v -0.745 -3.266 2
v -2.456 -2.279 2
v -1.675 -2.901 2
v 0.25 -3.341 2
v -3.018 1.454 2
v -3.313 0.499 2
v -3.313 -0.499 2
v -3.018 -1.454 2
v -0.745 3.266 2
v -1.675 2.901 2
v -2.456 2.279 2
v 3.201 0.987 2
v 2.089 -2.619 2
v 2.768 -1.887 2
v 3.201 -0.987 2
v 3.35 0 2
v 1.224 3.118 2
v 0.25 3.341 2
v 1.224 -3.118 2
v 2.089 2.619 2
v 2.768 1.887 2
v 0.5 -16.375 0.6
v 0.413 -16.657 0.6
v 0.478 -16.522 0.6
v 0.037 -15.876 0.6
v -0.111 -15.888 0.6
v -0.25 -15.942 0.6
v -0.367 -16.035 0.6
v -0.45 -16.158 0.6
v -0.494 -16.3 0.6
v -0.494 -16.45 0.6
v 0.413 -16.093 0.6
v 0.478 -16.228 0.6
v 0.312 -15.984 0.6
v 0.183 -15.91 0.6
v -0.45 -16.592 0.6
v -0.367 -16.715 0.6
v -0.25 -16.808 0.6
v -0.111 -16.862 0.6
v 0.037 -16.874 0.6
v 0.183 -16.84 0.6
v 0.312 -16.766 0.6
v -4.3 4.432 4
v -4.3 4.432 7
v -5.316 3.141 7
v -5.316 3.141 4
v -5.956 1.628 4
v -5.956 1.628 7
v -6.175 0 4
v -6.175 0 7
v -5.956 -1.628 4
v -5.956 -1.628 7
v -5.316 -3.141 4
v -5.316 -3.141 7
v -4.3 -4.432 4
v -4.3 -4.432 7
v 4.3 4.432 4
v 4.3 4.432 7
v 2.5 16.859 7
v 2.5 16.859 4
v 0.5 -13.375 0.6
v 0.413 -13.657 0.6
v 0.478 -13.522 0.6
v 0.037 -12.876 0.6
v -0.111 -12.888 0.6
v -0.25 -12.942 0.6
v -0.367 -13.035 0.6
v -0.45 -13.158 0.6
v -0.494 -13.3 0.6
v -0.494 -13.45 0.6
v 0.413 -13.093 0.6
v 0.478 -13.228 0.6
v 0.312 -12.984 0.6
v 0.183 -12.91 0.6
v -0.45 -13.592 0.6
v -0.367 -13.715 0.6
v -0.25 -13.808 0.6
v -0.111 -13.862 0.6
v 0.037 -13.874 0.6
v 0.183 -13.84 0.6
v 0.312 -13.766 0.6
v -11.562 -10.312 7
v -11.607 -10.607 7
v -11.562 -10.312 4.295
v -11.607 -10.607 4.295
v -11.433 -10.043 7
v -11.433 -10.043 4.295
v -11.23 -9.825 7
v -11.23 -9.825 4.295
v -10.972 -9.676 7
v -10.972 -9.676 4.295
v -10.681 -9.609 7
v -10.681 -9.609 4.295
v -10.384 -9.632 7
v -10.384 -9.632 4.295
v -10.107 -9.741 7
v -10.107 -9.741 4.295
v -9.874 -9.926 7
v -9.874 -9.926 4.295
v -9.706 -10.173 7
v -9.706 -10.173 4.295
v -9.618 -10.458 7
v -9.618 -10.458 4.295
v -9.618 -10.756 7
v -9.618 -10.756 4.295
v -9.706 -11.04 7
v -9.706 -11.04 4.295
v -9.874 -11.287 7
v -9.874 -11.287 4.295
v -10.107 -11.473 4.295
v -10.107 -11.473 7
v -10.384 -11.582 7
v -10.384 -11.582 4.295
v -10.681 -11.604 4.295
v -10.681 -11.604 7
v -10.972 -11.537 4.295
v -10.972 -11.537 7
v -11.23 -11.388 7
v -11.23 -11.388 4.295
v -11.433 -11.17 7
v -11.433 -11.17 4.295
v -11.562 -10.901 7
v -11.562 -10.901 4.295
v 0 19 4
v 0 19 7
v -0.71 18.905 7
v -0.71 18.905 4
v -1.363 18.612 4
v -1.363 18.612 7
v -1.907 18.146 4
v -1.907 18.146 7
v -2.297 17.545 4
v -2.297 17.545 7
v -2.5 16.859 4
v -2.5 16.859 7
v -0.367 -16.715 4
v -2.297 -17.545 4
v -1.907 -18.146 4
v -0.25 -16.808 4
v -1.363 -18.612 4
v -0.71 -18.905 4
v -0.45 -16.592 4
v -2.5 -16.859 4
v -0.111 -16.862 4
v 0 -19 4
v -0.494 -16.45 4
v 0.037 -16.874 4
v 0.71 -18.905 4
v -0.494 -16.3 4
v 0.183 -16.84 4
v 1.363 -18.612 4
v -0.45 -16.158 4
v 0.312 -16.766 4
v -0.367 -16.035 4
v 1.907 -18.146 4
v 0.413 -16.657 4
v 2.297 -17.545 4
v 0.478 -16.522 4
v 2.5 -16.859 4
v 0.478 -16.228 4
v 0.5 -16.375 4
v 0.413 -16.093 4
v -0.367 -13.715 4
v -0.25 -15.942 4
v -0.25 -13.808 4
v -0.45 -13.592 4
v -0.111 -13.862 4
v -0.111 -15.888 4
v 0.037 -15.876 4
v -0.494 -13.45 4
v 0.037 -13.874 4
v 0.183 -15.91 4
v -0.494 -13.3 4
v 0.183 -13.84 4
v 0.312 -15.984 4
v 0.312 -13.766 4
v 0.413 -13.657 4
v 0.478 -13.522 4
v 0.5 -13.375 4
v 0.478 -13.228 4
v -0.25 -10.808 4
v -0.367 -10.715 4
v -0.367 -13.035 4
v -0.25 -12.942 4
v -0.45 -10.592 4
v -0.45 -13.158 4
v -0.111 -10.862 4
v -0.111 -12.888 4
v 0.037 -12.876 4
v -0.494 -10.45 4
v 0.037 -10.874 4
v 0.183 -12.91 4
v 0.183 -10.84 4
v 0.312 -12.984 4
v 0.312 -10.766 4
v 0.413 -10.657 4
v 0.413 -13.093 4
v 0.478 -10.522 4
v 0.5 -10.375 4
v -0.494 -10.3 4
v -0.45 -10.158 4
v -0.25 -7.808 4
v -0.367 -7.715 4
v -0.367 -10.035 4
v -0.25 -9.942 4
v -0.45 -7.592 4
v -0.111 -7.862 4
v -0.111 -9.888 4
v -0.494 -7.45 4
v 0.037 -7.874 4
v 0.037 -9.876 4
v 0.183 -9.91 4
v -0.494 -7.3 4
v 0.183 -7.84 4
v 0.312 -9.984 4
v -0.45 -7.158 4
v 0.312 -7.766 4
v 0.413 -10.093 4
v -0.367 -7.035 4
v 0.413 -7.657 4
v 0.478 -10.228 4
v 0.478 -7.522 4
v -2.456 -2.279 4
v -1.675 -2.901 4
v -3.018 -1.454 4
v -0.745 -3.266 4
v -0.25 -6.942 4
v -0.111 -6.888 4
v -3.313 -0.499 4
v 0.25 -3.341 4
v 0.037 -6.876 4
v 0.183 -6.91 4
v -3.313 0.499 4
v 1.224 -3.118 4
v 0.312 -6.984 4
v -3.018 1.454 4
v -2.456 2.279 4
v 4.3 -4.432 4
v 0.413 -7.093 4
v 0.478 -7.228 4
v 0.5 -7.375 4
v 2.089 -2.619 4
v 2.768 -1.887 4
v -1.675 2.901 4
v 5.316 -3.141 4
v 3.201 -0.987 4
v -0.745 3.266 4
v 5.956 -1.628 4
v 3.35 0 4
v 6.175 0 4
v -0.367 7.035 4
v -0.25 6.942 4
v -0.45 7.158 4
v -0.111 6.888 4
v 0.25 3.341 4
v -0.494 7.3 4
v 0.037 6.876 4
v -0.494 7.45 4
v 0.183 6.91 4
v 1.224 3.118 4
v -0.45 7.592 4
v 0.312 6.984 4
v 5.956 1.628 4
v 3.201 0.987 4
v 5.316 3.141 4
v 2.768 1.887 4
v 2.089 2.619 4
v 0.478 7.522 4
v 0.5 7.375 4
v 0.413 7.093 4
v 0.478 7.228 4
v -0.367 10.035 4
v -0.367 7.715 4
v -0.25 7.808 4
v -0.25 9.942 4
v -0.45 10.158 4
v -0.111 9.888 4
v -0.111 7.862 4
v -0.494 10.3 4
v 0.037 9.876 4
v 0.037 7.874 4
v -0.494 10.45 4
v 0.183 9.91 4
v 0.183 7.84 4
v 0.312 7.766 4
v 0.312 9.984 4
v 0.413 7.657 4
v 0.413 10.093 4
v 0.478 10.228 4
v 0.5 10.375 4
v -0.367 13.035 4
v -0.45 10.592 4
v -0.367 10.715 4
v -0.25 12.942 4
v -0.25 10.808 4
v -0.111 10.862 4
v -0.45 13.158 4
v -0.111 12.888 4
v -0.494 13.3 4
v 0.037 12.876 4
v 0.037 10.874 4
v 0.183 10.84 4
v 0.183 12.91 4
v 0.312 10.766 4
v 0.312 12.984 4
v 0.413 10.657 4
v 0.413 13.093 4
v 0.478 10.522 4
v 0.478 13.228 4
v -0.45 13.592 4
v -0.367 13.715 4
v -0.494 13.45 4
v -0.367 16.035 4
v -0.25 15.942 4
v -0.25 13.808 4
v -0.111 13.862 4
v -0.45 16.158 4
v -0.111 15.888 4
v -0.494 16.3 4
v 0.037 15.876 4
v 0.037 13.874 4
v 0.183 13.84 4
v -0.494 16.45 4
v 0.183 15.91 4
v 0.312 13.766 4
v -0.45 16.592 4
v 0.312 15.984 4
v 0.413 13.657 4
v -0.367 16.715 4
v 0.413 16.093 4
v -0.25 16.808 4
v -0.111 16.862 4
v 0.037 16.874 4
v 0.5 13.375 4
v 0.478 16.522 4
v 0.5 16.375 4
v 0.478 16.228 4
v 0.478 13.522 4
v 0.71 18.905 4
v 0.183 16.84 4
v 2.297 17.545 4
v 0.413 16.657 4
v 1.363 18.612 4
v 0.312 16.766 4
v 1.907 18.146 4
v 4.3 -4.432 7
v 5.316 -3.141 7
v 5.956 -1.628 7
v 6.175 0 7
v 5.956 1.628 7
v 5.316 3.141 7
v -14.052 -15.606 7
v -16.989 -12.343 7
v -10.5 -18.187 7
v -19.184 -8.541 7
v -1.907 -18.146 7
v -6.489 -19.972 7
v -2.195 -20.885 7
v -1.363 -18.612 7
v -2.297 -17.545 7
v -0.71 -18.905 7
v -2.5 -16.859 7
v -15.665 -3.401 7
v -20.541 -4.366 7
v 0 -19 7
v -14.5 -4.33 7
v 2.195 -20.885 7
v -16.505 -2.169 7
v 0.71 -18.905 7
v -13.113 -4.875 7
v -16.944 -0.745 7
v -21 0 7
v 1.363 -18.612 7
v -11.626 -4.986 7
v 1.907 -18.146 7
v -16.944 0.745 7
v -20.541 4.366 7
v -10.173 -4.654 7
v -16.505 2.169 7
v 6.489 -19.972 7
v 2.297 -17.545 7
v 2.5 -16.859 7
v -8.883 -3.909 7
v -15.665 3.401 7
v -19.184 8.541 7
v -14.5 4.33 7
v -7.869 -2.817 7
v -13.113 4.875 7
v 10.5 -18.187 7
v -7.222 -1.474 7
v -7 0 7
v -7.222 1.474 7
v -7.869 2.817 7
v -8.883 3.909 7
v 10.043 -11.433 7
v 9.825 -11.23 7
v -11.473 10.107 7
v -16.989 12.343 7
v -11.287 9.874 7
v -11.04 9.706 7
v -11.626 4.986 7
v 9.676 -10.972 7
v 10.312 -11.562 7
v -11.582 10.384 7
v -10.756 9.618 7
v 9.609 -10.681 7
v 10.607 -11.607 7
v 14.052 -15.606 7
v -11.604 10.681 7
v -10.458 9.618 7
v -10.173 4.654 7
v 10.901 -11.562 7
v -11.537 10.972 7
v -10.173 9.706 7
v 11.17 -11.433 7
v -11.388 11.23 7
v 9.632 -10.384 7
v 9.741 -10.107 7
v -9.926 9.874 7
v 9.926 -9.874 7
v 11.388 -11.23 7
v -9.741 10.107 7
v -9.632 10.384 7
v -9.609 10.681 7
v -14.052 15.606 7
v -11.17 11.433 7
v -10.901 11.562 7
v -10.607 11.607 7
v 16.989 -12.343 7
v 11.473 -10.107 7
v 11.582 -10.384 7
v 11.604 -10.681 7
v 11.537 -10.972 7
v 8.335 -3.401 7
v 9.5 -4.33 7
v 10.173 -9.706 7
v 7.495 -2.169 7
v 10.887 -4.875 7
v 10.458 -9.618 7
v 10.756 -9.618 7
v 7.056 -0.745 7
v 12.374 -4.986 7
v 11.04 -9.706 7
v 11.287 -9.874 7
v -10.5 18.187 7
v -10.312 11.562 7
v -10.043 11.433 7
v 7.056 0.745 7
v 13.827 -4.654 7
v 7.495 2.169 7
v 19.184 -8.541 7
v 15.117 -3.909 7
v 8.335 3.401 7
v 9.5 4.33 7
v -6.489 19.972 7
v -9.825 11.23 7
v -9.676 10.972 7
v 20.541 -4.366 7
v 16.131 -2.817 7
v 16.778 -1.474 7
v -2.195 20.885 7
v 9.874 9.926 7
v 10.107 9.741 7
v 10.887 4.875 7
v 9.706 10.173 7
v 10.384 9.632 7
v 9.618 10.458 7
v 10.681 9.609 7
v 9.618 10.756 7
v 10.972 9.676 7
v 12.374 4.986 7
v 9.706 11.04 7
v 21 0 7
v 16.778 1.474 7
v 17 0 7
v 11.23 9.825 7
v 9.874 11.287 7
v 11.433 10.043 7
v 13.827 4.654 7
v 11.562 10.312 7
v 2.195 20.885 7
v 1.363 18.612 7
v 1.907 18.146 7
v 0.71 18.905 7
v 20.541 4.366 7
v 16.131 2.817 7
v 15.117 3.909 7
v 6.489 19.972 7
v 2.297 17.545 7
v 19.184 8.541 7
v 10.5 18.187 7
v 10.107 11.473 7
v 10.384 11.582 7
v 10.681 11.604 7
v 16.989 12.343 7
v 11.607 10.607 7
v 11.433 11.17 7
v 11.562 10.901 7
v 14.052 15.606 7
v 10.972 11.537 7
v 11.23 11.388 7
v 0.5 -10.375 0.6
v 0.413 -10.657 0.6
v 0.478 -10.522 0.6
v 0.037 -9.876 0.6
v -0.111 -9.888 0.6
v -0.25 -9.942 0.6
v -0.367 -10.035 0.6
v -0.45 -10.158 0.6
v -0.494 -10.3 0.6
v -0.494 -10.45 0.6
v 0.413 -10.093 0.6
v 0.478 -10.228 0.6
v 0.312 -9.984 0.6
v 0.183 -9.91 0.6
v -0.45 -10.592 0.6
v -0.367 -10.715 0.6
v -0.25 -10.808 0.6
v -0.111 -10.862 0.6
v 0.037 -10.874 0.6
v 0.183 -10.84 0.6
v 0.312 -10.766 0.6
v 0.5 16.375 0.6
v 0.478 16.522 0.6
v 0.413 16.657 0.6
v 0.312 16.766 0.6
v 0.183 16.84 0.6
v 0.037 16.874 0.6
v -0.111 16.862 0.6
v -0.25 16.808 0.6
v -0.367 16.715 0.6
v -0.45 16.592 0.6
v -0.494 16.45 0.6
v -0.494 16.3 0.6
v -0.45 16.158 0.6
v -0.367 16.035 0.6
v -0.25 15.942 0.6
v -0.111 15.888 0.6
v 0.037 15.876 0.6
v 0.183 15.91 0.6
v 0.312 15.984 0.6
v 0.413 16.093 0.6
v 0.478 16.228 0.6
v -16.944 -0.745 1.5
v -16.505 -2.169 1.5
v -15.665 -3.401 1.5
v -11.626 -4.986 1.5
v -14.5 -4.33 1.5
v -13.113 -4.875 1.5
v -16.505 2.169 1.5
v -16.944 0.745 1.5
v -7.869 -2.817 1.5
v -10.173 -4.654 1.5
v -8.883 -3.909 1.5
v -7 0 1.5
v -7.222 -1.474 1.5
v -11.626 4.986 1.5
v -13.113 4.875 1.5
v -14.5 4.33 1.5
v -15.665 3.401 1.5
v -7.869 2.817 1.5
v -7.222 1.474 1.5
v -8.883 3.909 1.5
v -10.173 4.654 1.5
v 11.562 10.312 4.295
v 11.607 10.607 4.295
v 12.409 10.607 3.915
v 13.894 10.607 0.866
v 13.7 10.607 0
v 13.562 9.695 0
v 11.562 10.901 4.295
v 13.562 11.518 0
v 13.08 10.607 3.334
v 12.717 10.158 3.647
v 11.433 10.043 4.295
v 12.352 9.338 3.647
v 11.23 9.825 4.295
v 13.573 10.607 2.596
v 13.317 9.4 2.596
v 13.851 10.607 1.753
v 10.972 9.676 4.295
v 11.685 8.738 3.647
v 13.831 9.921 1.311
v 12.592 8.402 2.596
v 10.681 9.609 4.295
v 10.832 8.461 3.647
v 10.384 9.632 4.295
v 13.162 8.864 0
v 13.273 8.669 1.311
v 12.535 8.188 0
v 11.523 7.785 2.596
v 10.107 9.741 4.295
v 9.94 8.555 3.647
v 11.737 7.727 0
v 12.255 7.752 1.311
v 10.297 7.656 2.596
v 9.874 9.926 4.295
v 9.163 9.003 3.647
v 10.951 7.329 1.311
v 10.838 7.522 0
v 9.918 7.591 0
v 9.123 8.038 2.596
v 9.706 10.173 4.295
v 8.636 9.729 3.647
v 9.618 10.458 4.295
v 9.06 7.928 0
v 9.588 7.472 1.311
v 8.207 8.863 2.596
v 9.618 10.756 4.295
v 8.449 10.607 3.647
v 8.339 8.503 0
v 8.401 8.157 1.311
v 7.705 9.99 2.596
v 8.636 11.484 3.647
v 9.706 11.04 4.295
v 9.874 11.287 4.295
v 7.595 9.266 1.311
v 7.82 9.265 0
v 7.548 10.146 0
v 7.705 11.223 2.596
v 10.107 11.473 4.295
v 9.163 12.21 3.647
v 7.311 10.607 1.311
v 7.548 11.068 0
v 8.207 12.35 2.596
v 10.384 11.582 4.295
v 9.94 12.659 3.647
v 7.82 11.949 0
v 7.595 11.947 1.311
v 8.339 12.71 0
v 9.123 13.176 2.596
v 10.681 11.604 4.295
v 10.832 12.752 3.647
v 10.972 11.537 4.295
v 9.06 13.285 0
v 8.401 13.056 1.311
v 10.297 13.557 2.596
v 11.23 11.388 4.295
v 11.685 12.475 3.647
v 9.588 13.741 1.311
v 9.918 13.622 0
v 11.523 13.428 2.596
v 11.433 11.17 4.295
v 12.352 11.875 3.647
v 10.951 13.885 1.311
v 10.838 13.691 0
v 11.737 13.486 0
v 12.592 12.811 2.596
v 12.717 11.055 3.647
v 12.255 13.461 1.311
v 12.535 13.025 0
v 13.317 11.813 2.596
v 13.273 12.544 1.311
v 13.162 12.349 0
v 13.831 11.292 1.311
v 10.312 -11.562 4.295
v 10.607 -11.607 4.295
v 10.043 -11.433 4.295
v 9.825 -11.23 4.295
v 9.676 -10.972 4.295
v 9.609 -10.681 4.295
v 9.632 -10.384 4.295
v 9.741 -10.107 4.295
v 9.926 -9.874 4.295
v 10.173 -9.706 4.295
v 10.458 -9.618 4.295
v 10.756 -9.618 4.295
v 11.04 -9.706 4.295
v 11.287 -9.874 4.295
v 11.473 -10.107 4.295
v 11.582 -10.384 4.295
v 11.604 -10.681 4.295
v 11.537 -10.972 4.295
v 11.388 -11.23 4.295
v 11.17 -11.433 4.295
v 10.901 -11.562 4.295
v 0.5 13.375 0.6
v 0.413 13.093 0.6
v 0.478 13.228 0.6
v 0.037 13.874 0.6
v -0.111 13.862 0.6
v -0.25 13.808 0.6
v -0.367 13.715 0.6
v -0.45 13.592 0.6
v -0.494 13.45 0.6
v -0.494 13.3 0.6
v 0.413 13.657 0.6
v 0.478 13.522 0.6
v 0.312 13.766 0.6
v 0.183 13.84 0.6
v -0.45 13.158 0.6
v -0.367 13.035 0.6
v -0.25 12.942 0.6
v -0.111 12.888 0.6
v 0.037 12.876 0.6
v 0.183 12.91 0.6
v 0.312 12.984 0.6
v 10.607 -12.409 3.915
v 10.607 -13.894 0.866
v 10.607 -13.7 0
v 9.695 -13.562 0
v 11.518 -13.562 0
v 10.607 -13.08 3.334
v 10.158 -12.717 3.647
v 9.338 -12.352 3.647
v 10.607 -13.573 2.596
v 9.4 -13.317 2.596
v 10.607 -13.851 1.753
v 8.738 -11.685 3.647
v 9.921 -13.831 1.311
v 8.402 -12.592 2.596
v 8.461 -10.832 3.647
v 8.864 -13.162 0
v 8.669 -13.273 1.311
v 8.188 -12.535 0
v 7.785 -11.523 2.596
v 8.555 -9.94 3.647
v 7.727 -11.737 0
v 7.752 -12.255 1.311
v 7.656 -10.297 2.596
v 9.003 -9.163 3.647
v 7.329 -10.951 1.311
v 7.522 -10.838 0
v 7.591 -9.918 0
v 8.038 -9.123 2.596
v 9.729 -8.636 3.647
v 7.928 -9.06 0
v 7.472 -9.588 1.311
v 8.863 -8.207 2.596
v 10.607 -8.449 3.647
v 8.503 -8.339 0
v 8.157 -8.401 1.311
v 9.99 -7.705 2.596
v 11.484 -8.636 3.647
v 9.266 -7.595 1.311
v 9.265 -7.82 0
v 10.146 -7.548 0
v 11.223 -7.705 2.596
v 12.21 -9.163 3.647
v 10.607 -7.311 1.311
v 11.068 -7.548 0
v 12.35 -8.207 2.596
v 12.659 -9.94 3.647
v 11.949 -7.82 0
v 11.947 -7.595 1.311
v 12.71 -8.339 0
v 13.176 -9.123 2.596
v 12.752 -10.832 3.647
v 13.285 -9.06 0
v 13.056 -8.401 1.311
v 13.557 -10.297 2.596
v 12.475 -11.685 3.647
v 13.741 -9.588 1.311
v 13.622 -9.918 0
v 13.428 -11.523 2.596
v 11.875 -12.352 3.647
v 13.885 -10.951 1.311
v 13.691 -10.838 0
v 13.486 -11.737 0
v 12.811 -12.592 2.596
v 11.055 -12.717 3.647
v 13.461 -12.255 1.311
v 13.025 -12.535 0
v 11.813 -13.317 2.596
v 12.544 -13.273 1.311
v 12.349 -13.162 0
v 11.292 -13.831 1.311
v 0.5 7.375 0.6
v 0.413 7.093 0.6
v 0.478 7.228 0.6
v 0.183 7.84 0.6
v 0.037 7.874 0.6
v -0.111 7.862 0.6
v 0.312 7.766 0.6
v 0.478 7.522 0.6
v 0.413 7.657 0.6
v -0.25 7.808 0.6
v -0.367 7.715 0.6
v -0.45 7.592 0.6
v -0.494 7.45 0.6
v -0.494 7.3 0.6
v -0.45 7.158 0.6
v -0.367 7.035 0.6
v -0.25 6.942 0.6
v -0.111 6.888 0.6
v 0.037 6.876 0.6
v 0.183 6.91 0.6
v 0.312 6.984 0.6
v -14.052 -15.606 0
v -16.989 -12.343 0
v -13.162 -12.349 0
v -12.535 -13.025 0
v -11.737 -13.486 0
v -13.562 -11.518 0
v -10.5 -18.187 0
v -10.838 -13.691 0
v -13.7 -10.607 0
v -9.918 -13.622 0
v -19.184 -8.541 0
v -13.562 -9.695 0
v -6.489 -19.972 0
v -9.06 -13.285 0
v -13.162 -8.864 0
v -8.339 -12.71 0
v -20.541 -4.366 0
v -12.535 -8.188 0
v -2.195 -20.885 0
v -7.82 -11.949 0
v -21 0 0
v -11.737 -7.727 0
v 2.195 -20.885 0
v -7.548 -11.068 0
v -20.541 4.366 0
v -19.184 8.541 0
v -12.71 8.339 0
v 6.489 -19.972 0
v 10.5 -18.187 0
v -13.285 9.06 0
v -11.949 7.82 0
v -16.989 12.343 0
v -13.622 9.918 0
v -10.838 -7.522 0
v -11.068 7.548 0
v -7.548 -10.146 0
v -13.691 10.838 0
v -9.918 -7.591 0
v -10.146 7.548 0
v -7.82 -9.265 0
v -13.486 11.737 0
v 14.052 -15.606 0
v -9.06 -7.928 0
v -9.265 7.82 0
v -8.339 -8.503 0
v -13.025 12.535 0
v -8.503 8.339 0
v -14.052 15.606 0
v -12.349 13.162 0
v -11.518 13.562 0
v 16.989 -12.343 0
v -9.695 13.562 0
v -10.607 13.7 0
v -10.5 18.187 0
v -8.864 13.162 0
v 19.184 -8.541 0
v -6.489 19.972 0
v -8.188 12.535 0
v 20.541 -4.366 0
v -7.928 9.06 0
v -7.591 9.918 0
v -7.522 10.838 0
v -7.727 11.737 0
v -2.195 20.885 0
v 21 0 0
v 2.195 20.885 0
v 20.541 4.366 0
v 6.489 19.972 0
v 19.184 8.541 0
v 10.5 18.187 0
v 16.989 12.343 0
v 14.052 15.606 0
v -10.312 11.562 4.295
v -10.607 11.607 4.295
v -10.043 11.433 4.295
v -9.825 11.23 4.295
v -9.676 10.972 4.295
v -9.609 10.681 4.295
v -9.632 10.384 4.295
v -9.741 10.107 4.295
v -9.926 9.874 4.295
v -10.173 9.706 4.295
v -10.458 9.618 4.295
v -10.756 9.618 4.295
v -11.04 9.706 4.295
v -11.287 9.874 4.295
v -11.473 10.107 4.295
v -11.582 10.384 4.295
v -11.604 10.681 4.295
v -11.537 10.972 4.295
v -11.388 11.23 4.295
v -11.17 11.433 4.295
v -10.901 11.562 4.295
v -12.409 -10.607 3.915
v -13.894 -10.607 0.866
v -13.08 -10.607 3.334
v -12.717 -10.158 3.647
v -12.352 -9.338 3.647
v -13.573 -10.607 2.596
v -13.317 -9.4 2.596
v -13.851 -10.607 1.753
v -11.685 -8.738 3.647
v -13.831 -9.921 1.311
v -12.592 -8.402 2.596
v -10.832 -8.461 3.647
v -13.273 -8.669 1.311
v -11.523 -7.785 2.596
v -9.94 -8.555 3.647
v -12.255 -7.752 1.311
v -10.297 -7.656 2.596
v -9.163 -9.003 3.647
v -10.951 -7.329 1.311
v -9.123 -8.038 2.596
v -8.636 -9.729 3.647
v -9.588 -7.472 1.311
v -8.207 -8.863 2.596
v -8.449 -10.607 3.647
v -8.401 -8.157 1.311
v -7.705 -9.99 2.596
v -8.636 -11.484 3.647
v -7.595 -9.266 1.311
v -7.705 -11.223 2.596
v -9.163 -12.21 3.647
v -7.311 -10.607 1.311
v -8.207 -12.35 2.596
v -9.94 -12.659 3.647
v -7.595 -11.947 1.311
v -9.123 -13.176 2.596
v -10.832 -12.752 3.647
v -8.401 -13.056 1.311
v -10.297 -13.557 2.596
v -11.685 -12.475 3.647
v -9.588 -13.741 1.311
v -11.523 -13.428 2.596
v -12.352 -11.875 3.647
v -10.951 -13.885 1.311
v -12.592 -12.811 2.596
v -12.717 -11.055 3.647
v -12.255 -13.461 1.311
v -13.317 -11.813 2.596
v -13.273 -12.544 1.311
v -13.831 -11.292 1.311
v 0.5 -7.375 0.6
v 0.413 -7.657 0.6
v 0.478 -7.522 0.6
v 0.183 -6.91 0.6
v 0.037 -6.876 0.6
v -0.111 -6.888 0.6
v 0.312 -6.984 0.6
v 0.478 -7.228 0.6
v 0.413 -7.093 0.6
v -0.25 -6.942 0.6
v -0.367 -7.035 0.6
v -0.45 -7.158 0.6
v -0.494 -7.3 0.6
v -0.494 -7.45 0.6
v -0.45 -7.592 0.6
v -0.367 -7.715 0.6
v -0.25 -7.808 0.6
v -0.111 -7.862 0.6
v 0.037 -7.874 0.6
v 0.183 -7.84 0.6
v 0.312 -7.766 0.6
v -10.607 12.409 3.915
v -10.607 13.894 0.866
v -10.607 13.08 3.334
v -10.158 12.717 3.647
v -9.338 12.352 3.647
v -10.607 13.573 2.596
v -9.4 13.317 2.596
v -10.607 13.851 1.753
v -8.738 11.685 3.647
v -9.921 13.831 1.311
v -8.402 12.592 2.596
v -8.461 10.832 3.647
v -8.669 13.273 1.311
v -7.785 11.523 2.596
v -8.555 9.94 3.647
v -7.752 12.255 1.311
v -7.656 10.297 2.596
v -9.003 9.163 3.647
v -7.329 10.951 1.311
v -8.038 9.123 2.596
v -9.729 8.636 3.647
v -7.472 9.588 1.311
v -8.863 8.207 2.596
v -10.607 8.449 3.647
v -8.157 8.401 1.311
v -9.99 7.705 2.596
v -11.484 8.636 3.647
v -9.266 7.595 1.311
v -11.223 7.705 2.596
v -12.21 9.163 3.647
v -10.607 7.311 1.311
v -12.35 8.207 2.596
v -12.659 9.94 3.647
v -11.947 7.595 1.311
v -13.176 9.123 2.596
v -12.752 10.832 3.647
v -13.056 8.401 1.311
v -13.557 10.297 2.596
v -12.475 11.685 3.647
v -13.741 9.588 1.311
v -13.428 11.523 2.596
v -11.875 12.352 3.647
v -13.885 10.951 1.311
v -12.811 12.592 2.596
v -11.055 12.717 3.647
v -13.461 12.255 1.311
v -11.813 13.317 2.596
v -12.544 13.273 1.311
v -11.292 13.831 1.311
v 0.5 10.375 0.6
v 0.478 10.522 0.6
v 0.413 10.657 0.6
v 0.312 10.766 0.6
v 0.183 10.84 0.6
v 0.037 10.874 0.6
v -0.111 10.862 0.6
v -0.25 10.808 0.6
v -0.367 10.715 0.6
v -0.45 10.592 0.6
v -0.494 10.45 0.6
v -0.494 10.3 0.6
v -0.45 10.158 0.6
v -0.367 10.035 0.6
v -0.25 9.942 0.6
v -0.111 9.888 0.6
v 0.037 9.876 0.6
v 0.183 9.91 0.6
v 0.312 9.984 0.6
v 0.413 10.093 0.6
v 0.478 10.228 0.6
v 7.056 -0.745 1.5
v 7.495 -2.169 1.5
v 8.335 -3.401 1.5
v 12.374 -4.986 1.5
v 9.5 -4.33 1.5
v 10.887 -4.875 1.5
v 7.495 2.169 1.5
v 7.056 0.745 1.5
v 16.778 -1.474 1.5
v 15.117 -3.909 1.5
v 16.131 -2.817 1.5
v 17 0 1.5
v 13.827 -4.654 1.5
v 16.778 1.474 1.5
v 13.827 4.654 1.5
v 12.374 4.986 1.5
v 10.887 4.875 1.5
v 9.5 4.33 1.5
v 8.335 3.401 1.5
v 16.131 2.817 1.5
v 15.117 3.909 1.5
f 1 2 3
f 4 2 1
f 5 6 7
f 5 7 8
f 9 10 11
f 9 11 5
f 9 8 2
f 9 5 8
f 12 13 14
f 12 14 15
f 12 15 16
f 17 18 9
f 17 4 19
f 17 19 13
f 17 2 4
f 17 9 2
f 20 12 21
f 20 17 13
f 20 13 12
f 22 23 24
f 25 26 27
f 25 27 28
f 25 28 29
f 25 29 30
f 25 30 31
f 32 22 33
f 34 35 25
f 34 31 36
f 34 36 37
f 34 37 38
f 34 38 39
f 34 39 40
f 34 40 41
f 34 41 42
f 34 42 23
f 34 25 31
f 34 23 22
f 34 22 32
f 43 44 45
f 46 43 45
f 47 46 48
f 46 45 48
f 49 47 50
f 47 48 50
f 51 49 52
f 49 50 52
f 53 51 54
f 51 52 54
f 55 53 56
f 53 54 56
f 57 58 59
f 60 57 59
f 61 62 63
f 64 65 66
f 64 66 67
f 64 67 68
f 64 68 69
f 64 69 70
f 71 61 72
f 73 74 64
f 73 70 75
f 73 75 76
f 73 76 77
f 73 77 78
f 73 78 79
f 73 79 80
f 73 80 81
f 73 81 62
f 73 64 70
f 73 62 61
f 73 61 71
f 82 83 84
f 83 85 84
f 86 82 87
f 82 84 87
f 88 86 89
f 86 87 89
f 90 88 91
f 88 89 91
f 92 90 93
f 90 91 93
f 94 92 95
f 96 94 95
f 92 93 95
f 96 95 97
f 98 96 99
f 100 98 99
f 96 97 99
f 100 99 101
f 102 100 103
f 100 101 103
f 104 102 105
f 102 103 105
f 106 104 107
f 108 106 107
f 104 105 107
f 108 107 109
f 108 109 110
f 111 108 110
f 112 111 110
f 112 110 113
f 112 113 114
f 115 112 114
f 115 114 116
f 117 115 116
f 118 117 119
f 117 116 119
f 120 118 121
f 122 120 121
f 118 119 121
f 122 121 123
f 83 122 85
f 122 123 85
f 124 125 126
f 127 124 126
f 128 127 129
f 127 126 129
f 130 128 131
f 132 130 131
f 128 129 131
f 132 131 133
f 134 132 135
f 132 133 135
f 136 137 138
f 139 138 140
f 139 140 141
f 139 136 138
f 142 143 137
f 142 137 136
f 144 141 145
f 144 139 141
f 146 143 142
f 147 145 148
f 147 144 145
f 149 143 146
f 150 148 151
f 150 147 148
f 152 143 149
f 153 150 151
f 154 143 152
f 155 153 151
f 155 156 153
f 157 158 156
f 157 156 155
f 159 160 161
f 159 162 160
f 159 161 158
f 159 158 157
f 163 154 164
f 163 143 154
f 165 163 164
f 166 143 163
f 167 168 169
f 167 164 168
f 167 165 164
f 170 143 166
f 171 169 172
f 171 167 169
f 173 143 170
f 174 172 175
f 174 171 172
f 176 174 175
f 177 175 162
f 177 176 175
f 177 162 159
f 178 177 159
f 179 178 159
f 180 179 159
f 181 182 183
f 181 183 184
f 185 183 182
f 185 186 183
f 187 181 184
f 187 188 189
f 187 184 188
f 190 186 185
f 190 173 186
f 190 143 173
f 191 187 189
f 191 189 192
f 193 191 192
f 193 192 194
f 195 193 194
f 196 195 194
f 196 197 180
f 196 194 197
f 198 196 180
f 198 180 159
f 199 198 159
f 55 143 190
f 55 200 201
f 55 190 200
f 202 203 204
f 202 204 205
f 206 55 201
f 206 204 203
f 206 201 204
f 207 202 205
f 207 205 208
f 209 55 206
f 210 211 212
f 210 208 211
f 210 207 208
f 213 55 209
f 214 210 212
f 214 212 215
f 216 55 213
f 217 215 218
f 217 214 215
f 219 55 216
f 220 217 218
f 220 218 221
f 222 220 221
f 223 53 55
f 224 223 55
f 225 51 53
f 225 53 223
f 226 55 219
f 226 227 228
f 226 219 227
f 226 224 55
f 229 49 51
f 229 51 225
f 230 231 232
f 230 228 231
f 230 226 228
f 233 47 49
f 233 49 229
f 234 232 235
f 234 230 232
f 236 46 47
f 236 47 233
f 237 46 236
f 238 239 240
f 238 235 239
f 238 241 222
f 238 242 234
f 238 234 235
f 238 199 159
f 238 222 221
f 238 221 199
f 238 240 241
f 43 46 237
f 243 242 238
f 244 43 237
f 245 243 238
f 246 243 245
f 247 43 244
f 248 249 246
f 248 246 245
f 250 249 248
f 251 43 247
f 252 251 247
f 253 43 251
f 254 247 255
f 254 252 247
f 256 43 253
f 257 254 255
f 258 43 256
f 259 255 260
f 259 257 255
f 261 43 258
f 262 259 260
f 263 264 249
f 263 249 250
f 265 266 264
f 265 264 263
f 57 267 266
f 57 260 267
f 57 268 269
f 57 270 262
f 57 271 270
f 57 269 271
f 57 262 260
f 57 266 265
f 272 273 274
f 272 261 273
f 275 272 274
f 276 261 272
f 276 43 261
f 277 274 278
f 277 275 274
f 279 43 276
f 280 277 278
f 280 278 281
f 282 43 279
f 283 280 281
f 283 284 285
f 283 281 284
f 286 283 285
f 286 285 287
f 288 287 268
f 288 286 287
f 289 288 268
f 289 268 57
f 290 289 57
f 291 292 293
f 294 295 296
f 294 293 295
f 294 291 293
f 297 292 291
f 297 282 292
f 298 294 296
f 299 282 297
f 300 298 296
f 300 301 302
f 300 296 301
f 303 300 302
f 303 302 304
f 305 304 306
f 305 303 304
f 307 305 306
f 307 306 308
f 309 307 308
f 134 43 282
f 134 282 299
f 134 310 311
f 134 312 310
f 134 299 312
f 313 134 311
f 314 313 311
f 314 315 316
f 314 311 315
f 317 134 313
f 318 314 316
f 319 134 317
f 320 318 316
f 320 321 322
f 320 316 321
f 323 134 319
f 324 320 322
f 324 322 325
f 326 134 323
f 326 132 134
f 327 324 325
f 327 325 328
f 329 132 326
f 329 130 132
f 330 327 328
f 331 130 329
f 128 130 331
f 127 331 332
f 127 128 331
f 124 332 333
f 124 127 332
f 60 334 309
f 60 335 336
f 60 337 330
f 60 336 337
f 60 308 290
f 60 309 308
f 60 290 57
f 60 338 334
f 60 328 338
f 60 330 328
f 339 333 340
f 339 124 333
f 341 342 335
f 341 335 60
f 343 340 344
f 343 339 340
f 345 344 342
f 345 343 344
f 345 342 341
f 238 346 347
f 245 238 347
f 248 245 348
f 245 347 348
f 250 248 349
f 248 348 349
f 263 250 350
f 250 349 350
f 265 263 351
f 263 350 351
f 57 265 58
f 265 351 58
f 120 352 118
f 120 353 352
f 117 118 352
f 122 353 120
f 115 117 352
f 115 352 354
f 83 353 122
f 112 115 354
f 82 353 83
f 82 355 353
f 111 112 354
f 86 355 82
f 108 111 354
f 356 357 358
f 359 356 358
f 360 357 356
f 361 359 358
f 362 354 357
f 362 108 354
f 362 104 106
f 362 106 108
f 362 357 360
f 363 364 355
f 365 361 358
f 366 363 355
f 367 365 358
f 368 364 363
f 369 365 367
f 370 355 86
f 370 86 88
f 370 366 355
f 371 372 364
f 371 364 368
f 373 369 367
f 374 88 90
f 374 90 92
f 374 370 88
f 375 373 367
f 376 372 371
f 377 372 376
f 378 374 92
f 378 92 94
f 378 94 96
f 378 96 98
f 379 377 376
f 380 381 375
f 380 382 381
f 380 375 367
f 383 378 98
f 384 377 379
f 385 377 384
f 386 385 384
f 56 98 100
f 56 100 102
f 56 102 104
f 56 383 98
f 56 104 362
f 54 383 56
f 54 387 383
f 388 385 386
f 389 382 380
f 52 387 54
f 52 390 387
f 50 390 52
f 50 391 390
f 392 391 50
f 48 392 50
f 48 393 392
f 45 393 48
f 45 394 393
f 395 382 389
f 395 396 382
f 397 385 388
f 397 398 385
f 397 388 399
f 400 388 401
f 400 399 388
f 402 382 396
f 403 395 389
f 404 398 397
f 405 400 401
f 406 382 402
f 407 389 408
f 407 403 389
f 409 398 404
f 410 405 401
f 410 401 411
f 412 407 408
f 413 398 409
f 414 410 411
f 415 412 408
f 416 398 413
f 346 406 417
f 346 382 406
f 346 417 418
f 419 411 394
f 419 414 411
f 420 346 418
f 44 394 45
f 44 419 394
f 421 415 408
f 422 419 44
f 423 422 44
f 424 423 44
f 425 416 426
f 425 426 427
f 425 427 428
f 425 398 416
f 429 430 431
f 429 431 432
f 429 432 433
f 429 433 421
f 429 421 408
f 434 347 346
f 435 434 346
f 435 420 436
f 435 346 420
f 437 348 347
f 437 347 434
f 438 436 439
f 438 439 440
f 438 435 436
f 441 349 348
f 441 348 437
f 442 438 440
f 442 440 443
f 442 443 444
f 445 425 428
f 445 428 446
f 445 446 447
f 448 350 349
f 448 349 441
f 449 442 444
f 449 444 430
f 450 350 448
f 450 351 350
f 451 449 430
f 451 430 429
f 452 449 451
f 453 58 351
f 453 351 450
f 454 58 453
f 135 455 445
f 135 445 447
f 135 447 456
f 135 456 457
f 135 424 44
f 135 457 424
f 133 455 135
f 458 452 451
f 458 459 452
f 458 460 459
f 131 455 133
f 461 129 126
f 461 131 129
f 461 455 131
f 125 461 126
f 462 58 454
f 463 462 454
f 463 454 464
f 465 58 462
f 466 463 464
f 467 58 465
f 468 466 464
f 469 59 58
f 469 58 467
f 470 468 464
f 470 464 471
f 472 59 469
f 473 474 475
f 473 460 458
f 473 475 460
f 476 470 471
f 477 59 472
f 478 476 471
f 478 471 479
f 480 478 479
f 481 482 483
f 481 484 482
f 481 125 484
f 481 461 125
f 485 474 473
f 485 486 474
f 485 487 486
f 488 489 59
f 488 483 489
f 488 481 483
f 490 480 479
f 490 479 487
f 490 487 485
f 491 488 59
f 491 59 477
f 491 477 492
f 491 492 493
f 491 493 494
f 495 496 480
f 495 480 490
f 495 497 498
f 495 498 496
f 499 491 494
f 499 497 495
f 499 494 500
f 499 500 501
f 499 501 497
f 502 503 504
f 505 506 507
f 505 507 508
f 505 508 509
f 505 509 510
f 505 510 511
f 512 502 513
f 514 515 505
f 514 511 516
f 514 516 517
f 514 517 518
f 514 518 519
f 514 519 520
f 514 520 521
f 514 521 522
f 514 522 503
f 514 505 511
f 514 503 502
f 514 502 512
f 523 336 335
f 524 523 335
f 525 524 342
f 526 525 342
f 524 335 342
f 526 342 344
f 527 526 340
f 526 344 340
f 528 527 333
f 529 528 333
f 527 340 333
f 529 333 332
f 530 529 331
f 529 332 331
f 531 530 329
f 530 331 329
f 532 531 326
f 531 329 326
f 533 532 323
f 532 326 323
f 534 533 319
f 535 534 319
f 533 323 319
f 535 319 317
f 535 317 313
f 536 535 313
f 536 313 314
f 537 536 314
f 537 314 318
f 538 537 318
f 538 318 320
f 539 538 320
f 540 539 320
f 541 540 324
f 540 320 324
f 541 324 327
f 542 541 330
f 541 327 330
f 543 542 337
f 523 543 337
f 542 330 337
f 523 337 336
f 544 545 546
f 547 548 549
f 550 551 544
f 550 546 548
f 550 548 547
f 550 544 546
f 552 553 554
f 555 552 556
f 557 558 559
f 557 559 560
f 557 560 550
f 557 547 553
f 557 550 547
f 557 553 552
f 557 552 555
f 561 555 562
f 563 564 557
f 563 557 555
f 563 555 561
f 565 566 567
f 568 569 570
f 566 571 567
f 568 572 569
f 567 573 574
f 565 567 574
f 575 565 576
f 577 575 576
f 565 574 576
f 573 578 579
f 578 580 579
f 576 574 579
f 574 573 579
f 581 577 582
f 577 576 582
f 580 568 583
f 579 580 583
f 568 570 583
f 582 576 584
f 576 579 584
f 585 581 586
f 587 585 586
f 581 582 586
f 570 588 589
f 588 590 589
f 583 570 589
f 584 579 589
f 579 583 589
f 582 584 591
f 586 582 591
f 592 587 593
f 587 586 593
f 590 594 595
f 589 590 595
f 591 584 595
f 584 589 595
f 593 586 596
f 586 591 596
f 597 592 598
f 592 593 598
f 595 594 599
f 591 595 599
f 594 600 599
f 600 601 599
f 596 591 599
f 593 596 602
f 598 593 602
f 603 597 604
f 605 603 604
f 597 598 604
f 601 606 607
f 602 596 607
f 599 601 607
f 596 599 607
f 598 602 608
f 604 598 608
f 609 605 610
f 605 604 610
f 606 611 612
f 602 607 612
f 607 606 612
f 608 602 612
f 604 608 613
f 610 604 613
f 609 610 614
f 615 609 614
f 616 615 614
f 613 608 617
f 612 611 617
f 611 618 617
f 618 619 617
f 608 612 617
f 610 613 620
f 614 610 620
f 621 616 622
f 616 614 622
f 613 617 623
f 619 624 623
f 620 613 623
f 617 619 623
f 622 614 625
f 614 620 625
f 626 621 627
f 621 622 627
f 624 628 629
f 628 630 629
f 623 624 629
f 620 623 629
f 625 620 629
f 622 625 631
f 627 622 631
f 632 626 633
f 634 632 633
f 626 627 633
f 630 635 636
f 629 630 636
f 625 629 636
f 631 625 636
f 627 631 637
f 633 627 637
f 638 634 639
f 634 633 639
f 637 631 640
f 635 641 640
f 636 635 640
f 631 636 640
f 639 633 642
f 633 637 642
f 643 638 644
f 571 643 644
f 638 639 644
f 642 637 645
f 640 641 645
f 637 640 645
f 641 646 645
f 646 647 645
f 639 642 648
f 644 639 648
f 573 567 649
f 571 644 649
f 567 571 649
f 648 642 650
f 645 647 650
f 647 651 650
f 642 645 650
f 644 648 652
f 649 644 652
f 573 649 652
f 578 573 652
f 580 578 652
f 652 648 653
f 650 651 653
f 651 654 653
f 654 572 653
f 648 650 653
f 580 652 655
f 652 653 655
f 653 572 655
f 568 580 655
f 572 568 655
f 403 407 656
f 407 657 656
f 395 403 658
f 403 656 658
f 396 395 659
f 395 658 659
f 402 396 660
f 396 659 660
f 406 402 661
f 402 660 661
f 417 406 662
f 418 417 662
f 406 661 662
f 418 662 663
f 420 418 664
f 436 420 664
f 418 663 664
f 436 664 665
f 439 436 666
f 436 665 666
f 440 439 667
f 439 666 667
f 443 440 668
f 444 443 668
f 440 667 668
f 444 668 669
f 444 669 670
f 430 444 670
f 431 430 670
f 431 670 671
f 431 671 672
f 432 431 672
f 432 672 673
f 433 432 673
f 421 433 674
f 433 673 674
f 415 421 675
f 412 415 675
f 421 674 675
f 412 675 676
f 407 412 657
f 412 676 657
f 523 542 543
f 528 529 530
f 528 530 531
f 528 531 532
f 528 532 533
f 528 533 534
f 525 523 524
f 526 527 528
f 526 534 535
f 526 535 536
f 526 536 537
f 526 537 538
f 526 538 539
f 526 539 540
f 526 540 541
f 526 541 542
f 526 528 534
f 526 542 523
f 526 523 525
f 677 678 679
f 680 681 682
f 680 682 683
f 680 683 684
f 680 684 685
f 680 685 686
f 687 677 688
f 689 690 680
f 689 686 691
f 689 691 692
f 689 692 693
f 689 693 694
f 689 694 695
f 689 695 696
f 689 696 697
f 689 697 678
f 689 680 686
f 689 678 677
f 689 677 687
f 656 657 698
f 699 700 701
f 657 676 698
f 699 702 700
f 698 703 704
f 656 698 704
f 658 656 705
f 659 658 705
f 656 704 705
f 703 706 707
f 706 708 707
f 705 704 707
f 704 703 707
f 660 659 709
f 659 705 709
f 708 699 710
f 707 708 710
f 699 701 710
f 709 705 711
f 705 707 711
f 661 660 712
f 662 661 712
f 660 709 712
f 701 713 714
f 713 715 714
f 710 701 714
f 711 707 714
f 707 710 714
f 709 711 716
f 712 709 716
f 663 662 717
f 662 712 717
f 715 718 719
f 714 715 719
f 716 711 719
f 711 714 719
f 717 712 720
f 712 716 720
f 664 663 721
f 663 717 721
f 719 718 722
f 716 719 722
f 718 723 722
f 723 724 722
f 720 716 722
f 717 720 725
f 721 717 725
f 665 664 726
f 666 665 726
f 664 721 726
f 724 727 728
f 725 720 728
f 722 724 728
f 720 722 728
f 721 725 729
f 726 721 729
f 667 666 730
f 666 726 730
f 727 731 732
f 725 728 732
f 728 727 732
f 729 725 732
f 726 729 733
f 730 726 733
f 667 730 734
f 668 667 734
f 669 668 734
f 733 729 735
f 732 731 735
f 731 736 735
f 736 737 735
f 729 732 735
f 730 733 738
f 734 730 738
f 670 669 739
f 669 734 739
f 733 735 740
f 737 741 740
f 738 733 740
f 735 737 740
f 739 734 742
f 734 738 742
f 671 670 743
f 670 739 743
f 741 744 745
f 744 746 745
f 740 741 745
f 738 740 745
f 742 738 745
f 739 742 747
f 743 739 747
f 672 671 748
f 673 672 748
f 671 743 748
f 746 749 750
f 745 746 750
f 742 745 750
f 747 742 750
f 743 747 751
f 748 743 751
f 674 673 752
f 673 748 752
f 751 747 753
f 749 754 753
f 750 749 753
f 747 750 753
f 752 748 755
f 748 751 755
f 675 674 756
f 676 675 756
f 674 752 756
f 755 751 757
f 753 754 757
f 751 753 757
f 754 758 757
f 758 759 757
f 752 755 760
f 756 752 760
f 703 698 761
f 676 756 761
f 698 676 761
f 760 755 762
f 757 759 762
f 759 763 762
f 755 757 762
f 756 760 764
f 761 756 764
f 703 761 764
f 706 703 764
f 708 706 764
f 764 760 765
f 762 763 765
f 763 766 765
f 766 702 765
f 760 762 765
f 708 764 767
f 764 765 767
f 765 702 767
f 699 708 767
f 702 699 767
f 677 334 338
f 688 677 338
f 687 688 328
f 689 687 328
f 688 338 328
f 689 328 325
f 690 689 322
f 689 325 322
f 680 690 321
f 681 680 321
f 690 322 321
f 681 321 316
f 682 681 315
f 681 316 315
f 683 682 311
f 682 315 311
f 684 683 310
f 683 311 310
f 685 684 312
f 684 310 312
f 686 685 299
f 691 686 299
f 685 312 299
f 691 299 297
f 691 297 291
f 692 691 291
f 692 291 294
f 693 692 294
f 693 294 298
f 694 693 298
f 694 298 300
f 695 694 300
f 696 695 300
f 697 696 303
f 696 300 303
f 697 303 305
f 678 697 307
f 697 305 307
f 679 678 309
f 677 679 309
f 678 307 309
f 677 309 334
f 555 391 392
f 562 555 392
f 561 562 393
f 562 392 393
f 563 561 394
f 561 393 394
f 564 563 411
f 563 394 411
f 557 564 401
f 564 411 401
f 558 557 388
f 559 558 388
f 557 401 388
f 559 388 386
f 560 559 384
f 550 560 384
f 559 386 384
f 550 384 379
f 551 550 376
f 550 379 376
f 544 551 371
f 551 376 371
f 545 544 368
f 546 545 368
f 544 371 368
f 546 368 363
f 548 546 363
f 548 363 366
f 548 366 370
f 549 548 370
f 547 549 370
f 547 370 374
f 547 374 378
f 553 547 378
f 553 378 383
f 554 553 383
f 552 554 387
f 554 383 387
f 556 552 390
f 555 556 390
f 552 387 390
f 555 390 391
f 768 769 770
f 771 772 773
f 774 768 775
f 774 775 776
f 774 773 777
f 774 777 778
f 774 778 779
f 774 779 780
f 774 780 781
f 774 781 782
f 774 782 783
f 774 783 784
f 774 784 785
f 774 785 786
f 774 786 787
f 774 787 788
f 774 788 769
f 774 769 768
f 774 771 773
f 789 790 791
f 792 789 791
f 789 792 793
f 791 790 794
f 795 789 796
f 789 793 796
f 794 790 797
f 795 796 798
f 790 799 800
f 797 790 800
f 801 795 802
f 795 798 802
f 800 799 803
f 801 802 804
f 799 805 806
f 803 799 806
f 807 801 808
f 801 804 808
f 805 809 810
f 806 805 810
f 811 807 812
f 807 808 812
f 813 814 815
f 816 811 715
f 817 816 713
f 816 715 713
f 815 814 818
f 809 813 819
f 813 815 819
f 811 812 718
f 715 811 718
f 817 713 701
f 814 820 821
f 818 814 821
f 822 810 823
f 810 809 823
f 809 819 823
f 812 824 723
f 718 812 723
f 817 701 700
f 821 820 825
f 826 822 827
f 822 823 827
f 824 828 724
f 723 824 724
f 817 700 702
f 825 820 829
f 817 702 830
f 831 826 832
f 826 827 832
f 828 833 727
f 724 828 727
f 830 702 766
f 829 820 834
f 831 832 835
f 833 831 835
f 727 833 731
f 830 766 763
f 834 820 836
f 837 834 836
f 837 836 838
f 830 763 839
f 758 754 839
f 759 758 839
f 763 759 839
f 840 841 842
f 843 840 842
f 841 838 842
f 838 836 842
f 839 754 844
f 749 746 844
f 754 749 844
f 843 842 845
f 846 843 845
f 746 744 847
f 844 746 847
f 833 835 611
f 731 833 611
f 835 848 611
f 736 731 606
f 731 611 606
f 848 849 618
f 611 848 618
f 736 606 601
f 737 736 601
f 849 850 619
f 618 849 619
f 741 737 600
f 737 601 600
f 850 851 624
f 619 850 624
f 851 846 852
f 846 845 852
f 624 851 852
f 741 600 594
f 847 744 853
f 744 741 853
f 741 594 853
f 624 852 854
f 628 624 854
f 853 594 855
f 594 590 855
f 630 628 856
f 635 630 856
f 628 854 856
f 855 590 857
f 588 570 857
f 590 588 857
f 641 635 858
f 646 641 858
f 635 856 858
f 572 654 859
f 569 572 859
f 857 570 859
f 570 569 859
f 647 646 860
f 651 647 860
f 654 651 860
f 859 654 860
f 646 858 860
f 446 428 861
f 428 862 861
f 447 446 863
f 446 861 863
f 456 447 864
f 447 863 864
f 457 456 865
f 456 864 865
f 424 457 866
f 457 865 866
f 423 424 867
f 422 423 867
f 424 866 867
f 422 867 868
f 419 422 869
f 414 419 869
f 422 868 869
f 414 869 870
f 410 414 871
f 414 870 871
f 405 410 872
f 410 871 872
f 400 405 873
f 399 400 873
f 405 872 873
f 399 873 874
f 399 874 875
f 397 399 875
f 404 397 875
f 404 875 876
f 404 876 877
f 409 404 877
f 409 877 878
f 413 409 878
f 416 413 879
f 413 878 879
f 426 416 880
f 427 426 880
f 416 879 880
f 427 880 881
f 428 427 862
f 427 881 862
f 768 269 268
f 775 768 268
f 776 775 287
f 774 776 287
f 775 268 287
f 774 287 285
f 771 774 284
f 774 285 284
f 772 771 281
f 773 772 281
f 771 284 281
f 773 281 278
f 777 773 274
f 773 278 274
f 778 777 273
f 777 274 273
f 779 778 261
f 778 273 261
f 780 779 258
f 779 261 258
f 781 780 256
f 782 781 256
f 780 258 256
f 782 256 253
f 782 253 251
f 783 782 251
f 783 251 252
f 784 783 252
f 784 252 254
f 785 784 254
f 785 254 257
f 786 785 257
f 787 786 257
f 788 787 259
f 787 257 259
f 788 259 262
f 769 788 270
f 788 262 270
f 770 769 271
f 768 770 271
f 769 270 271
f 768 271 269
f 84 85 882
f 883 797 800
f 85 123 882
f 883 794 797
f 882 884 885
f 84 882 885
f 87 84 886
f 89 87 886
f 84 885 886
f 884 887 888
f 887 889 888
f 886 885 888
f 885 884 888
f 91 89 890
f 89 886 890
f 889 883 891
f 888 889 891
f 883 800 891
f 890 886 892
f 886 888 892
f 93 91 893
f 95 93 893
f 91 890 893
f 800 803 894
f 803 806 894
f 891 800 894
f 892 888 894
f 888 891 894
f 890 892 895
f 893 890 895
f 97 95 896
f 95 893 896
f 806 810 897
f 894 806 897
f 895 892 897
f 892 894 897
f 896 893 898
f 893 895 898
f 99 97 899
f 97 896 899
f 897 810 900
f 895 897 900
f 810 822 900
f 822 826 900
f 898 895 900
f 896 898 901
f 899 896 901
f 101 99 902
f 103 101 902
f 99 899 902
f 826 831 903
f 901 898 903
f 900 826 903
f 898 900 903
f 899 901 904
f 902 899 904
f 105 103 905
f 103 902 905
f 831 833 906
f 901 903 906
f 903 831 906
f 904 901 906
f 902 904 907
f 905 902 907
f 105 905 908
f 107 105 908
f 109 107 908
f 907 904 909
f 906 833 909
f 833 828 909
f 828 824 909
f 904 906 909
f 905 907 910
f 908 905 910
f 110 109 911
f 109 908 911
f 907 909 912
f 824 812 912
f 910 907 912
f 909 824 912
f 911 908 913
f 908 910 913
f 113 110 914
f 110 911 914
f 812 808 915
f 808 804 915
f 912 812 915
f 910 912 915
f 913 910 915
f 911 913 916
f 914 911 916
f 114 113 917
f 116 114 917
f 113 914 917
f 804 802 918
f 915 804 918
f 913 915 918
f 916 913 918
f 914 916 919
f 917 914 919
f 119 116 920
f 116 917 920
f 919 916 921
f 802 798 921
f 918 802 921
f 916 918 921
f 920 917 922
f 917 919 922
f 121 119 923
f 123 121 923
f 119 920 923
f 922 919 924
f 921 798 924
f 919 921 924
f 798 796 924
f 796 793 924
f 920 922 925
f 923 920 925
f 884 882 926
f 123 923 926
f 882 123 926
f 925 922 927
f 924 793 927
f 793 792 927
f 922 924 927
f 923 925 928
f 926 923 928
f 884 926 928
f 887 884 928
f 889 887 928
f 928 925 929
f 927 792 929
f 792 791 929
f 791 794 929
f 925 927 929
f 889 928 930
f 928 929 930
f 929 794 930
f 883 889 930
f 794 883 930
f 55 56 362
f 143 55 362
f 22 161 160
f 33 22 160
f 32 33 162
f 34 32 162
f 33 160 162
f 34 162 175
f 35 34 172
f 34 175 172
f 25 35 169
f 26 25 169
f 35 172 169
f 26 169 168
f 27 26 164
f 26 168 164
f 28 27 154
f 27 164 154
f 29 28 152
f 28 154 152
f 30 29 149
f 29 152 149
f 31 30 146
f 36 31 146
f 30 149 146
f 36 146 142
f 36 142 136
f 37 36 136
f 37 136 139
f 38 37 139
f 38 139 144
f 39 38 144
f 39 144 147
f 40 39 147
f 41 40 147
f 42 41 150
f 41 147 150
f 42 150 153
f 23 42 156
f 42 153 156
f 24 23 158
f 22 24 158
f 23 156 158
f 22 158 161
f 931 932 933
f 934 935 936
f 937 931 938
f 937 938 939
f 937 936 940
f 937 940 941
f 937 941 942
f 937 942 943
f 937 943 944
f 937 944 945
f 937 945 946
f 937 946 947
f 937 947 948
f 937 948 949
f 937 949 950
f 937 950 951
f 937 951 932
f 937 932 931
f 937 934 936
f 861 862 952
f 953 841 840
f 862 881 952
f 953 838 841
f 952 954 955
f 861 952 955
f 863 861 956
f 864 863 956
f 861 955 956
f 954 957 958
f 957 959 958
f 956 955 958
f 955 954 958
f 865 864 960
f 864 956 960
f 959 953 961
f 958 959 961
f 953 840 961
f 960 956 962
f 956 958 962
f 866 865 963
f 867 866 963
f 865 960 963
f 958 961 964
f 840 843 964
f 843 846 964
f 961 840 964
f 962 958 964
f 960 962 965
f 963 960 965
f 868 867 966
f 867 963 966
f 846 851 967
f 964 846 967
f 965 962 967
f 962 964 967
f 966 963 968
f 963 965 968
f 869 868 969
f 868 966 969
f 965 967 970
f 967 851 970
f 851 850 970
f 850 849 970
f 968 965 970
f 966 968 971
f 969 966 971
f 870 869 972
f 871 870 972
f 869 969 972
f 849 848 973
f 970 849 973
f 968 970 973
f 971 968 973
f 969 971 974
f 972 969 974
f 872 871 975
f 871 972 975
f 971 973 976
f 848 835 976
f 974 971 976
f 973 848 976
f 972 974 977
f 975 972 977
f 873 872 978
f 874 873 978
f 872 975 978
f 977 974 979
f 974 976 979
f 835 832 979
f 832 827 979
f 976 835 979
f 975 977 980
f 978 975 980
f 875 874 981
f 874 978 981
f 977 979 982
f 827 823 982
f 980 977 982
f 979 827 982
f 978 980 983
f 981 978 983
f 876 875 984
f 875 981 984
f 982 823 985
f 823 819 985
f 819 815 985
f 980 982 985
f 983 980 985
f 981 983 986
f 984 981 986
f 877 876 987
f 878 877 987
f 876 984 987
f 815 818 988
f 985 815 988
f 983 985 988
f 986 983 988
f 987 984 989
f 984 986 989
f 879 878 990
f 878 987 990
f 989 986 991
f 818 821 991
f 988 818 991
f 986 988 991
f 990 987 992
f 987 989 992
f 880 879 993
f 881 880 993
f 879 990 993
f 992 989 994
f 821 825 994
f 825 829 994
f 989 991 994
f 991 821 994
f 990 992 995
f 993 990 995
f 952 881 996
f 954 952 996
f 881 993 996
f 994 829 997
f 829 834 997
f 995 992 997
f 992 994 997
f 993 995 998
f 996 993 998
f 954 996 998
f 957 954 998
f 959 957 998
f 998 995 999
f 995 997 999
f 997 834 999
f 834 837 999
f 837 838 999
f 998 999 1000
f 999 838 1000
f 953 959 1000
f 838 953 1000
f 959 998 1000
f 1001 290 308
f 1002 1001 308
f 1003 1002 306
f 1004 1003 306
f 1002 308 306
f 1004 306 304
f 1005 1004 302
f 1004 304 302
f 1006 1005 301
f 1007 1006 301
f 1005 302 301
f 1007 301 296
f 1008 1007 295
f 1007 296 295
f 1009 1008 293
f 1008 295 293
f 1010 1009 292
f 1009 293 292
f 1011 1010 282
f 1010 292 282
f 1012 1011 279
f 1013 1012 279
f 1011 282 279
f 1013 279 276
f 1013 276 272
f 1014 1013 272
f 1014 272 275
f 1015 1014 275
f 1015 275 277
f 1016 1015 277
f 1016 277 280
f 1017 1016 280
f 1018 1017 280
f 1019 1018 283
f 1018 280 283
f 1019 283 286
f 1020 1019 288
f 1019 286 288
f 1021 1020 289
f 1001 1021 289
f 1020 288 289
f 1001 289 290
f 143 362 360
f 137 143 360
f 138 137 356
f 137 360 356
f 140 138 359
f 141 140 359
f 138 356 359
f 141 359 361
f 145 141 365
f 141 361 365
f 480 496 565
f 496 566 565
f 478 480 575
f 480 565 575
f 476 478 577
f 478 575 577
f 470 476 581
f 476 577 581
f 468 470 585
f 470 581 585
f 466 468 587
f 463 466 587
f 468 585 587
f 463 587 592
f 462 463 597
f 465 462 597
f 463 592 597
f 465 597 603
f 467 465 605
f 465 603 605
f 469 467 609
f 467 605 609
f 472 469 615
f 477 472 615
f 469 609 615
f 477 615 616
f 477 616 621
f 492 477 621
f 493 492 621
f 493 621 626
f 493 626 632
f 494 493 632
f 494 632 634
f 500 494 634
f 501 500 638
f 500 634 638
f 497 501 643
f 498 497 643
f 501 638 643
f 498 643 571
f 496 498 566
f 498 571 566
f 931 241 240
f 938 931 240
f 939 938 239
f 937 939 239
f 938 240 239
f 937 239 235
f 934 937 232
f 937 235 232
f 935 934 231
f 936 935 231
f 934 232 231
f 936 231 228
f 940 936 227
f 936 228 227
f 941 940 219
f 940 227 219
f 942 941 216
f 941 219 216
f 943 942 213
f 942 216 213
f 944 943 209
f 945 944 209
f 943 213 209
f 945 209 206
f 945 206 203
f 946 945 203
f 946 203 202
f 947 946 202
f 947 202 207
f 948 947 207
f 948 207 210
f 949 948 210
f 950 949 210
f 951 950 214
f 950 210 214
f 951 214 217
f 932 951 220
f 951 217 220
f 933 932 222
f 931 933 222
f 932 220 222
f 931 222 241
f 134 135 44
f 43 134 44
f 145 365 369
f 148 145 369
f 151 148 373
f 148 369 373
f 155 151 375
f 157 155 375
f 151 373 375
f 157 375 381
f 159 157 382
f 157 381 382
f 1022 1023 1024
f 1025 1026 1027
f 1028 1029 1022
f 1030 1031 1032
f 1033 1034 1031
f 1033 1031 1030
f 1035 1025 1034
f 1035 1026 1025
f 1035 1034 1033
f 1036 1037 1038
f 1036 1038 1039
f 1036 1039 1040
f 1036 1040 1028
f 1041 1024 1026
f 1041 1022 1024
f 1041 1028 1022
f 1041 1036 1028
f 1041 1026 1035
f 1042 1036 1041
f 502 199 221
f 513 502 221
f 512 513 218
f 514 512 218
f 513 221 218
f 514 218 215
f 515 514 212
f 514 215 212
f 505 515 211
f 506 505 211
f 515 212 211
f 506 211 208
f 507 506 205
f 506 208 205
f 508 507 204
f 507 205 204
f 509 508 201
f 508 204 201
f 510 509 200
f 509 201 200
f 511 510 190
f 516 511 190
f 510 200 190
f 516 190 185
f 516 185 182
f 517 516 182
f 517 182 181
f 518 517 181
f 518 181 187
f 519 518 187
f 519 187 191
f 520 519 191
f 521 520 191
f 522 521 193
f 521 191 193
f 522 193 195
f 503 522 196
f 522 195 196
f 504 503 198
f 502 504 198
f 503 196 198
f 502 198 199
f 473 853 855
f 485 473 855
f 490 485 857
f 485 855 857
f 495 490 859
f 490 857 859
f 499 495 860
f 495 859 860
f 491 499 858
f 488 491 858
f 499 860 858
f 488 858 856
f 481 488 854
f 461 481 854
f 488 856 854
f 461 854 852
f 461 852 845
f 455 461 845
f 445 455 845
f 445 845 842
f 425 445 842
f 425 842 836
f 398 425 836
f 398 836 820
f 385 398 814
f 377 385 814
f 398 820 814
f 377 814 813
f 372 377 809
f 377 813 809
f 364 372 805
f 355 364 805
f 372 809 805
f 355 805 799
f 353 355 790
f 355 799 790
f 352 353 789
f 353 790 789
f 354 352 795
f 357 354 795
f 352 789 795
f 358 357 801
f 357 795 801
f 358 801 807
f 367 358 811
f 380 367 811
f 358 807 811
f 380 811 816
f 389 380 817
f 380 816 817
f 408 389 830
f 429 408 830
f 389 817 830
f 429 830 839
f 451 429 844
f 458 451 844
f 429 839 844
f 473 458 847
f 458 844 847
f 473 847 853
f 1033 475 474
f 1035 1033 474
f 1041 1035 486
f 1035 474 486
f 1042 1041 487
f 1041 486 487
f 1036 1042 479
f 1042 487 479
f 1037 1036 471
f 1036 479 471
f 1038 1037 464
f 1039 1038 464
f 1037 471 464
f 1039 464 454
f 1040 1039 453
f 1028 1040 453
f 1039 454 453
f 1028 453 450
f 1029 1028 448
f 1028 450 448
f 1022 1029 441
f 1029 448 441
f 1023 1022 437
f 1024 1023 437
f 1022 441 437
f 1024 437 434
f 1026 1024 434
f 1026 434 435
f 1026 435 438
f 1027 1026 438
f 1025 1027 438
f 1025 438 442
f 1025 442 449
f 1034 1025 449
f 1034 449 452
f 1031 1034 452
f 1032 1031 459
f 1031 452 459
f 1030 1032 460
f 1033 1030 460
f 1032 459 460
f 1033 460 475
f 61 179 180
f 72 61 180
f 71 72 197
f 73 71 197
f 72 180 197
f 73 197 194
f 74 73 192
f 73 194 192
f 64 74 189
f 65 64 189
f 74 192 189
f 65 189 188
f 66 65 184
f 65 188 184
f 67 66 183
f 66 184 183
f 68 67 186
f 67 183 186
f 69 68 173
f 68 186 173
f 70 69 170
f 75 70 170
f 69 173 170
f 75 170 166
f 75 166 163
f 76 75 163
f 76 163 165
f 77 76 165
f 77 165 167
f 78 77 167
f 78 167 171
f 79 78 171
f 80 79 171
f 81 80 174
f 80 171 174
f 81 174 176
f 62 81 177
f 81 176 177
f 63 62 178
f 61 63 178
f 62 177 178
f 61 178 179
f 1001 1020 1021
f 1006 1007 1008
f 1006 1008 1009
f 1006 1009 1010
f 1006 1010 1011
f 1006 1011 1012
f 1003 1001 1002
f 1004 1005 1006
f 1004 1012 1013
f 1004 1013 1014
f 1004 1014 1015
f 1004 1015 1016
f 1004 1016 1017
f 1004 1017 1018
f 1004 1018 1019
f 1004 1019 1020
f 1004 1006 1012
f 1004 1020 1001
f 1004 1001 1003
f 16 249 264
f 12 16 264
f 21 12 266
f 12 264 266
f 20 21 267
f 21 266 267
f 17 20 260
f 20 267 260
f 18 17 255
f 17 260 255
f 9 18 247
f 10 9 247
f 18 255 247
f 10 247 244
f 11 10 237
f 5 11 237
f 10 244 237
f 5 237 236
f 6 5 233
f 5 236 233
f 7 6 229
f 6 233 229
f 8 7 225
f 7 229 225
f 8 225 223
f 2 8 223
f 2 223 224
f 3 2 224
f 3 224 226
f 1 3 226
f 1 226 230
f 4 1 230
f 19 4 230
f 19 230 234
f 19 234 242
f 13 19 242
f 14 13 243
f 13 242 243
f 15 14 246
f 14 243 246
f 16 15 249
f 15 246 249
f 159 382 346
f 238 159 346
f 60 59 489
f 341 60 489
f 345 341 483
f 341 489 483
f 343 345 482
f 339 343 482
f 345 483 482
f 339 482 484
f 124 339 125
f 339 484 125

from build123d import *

# Parameters (mm, degrees)
F0_R             = 21
F1_DEPTH         = 7
F3_DEPTH         = 3
F4_R             = 3.35
F5_DEPTH         = 2
F6_R             = 0.5
F7_DEPTH         = 3.4
F8_R             = 5
F9_DEPTH         = 5.5
F13_COPIES_COUNT = 4


# Not quite as in the source:
# - a pattern or mirror of a feature is missing from the dataset's text; its kind, count and spacing are read off the source's solid


with BuildPart() as f1:
    # F0 (on Top) → F1 (new body)
    with BuildSketch(Plane.XY):
        Circle(F0_R)
    extrude(amount=F1_DEPTH)

    # F2 (on face) → F3 (cut)
    with BuildSketch(Plane.XY.offset(7)):
        with BuildLine():
            Line((-2.5, 16.8585155142), (-4.3, 4.4317744753))
            ThreePointArc((-4.3, 4.4317744753), (-6.175, 0), (-4.3, -4.4317744753))
            Line((-4.3, -4.4317744753), (-2.5, -16.8585155142))
            ThreePointArc((-2.5, -16.8585155142), (-1.6521982913, -18.3987898667), (0, -19))
            ThreePointArc((0, -19), (1.6521982913, -18.3987898667), (2.5, -16.8585155142))
            Line((2.5, -16.8585155142), (4.3, -4.4317744753))
            ThreePointArc((4.3, -4.4317744753), (6.175, 0), (4.3, 4.4317744753))
            Line((4.3, 4.4317744753), (2.5, 16.8585155142))
            ThreePointArc((2.5, 16.8585155142), (1.6521982913, 18.3987898667), (0, 19))
            ThreePointArc((0, 19), (-1.6521982913, 18.3987898667), (-2.5, 16.8585155142))
        make_face()
    extrude(amount=-F3_DEPTH, mode=Mode.SUBTRACT)

    # F4 (on face) → F5 (cut)
    with BuildSketch(Plane.XY.offset(4)):
        Circle(F4_R)
    extrude(amount=-F5_DEPTH, mode=Mode.SUBTRACT)

    # F6 (on face) → F7 (cut)
    with BuildSketch(Plane.XY.offset(4)):
        with Locations((0, 7.375)):
            Circle(F6_R)
        with Locations((0, 10.375)):
            Circle(F6_R)
        with Locations((0, 13.375)):
            Circle(F6_R)
        with Locations((0, 16.375)):
            Circle(F6_R)
        with Locations((0, -7.375)):
            Circle(F6_R)
        with Locations((0, -10.375)):
            Circle(F6_R)
        with Locations((0, -13.375)):
            Circle(F6_R)
        with Locations((0, -16.375)):
            Circle(F6_R)
    extrude(amount=-F7_DEPTH, mode=Mode.SUBTRACT)

    # F8 (on face) → F9 (cut, through all)
    with BuildSketch(Plane.XY.offset(7)):
        with Locations((-12, 0)):
            Circle(F8_R)
        with Locations((12, 0)):
            Circle(F8_R)
    extrude(amount=-F9_DEPTH, mode=Mode.SUBTRACT)

    # F12 (on plane+point) → F13 (revolve, cut)
    with BuildSketch(Plane.XZ.offset(10.6066017178)):
        with BuildLine():
            Line((-10.6066017178, 0), (-10.6066017178, 7))
            Line((-10.6066017178, 7), (-11.6066017178, 7.0008294335))
            Line((-11.6066017178, 7.0008294335), (-11.6066017178, 4.2948370387))
            ThreePointArc((-11.6066017178, 4.2948370387), (-13.8675802694, 0.6440169112), (-10.6066017178, -2.15))
            Line((-10.6066017178, -2.15), (-10.6066017178, 0))
        make_face()
    f13 = revolve(axis=Axis((-10.6066017178, -10.6066017178, -1.075), (0, 0, -1)), mode=Mode.SUBTRACT)

    # F13_copies: F13 ×4 about axis
    f13_copies_axis = Axis((0, 0, 0), (0, 0, 1))
    for i in range(1, F13_COPIES_COUNT):
        add(f13.rotate(f13_copies_axis, i * 360 / F13_COPIES_COUNT), mode=Mode.SUBTRACT)


solid = f1.part
